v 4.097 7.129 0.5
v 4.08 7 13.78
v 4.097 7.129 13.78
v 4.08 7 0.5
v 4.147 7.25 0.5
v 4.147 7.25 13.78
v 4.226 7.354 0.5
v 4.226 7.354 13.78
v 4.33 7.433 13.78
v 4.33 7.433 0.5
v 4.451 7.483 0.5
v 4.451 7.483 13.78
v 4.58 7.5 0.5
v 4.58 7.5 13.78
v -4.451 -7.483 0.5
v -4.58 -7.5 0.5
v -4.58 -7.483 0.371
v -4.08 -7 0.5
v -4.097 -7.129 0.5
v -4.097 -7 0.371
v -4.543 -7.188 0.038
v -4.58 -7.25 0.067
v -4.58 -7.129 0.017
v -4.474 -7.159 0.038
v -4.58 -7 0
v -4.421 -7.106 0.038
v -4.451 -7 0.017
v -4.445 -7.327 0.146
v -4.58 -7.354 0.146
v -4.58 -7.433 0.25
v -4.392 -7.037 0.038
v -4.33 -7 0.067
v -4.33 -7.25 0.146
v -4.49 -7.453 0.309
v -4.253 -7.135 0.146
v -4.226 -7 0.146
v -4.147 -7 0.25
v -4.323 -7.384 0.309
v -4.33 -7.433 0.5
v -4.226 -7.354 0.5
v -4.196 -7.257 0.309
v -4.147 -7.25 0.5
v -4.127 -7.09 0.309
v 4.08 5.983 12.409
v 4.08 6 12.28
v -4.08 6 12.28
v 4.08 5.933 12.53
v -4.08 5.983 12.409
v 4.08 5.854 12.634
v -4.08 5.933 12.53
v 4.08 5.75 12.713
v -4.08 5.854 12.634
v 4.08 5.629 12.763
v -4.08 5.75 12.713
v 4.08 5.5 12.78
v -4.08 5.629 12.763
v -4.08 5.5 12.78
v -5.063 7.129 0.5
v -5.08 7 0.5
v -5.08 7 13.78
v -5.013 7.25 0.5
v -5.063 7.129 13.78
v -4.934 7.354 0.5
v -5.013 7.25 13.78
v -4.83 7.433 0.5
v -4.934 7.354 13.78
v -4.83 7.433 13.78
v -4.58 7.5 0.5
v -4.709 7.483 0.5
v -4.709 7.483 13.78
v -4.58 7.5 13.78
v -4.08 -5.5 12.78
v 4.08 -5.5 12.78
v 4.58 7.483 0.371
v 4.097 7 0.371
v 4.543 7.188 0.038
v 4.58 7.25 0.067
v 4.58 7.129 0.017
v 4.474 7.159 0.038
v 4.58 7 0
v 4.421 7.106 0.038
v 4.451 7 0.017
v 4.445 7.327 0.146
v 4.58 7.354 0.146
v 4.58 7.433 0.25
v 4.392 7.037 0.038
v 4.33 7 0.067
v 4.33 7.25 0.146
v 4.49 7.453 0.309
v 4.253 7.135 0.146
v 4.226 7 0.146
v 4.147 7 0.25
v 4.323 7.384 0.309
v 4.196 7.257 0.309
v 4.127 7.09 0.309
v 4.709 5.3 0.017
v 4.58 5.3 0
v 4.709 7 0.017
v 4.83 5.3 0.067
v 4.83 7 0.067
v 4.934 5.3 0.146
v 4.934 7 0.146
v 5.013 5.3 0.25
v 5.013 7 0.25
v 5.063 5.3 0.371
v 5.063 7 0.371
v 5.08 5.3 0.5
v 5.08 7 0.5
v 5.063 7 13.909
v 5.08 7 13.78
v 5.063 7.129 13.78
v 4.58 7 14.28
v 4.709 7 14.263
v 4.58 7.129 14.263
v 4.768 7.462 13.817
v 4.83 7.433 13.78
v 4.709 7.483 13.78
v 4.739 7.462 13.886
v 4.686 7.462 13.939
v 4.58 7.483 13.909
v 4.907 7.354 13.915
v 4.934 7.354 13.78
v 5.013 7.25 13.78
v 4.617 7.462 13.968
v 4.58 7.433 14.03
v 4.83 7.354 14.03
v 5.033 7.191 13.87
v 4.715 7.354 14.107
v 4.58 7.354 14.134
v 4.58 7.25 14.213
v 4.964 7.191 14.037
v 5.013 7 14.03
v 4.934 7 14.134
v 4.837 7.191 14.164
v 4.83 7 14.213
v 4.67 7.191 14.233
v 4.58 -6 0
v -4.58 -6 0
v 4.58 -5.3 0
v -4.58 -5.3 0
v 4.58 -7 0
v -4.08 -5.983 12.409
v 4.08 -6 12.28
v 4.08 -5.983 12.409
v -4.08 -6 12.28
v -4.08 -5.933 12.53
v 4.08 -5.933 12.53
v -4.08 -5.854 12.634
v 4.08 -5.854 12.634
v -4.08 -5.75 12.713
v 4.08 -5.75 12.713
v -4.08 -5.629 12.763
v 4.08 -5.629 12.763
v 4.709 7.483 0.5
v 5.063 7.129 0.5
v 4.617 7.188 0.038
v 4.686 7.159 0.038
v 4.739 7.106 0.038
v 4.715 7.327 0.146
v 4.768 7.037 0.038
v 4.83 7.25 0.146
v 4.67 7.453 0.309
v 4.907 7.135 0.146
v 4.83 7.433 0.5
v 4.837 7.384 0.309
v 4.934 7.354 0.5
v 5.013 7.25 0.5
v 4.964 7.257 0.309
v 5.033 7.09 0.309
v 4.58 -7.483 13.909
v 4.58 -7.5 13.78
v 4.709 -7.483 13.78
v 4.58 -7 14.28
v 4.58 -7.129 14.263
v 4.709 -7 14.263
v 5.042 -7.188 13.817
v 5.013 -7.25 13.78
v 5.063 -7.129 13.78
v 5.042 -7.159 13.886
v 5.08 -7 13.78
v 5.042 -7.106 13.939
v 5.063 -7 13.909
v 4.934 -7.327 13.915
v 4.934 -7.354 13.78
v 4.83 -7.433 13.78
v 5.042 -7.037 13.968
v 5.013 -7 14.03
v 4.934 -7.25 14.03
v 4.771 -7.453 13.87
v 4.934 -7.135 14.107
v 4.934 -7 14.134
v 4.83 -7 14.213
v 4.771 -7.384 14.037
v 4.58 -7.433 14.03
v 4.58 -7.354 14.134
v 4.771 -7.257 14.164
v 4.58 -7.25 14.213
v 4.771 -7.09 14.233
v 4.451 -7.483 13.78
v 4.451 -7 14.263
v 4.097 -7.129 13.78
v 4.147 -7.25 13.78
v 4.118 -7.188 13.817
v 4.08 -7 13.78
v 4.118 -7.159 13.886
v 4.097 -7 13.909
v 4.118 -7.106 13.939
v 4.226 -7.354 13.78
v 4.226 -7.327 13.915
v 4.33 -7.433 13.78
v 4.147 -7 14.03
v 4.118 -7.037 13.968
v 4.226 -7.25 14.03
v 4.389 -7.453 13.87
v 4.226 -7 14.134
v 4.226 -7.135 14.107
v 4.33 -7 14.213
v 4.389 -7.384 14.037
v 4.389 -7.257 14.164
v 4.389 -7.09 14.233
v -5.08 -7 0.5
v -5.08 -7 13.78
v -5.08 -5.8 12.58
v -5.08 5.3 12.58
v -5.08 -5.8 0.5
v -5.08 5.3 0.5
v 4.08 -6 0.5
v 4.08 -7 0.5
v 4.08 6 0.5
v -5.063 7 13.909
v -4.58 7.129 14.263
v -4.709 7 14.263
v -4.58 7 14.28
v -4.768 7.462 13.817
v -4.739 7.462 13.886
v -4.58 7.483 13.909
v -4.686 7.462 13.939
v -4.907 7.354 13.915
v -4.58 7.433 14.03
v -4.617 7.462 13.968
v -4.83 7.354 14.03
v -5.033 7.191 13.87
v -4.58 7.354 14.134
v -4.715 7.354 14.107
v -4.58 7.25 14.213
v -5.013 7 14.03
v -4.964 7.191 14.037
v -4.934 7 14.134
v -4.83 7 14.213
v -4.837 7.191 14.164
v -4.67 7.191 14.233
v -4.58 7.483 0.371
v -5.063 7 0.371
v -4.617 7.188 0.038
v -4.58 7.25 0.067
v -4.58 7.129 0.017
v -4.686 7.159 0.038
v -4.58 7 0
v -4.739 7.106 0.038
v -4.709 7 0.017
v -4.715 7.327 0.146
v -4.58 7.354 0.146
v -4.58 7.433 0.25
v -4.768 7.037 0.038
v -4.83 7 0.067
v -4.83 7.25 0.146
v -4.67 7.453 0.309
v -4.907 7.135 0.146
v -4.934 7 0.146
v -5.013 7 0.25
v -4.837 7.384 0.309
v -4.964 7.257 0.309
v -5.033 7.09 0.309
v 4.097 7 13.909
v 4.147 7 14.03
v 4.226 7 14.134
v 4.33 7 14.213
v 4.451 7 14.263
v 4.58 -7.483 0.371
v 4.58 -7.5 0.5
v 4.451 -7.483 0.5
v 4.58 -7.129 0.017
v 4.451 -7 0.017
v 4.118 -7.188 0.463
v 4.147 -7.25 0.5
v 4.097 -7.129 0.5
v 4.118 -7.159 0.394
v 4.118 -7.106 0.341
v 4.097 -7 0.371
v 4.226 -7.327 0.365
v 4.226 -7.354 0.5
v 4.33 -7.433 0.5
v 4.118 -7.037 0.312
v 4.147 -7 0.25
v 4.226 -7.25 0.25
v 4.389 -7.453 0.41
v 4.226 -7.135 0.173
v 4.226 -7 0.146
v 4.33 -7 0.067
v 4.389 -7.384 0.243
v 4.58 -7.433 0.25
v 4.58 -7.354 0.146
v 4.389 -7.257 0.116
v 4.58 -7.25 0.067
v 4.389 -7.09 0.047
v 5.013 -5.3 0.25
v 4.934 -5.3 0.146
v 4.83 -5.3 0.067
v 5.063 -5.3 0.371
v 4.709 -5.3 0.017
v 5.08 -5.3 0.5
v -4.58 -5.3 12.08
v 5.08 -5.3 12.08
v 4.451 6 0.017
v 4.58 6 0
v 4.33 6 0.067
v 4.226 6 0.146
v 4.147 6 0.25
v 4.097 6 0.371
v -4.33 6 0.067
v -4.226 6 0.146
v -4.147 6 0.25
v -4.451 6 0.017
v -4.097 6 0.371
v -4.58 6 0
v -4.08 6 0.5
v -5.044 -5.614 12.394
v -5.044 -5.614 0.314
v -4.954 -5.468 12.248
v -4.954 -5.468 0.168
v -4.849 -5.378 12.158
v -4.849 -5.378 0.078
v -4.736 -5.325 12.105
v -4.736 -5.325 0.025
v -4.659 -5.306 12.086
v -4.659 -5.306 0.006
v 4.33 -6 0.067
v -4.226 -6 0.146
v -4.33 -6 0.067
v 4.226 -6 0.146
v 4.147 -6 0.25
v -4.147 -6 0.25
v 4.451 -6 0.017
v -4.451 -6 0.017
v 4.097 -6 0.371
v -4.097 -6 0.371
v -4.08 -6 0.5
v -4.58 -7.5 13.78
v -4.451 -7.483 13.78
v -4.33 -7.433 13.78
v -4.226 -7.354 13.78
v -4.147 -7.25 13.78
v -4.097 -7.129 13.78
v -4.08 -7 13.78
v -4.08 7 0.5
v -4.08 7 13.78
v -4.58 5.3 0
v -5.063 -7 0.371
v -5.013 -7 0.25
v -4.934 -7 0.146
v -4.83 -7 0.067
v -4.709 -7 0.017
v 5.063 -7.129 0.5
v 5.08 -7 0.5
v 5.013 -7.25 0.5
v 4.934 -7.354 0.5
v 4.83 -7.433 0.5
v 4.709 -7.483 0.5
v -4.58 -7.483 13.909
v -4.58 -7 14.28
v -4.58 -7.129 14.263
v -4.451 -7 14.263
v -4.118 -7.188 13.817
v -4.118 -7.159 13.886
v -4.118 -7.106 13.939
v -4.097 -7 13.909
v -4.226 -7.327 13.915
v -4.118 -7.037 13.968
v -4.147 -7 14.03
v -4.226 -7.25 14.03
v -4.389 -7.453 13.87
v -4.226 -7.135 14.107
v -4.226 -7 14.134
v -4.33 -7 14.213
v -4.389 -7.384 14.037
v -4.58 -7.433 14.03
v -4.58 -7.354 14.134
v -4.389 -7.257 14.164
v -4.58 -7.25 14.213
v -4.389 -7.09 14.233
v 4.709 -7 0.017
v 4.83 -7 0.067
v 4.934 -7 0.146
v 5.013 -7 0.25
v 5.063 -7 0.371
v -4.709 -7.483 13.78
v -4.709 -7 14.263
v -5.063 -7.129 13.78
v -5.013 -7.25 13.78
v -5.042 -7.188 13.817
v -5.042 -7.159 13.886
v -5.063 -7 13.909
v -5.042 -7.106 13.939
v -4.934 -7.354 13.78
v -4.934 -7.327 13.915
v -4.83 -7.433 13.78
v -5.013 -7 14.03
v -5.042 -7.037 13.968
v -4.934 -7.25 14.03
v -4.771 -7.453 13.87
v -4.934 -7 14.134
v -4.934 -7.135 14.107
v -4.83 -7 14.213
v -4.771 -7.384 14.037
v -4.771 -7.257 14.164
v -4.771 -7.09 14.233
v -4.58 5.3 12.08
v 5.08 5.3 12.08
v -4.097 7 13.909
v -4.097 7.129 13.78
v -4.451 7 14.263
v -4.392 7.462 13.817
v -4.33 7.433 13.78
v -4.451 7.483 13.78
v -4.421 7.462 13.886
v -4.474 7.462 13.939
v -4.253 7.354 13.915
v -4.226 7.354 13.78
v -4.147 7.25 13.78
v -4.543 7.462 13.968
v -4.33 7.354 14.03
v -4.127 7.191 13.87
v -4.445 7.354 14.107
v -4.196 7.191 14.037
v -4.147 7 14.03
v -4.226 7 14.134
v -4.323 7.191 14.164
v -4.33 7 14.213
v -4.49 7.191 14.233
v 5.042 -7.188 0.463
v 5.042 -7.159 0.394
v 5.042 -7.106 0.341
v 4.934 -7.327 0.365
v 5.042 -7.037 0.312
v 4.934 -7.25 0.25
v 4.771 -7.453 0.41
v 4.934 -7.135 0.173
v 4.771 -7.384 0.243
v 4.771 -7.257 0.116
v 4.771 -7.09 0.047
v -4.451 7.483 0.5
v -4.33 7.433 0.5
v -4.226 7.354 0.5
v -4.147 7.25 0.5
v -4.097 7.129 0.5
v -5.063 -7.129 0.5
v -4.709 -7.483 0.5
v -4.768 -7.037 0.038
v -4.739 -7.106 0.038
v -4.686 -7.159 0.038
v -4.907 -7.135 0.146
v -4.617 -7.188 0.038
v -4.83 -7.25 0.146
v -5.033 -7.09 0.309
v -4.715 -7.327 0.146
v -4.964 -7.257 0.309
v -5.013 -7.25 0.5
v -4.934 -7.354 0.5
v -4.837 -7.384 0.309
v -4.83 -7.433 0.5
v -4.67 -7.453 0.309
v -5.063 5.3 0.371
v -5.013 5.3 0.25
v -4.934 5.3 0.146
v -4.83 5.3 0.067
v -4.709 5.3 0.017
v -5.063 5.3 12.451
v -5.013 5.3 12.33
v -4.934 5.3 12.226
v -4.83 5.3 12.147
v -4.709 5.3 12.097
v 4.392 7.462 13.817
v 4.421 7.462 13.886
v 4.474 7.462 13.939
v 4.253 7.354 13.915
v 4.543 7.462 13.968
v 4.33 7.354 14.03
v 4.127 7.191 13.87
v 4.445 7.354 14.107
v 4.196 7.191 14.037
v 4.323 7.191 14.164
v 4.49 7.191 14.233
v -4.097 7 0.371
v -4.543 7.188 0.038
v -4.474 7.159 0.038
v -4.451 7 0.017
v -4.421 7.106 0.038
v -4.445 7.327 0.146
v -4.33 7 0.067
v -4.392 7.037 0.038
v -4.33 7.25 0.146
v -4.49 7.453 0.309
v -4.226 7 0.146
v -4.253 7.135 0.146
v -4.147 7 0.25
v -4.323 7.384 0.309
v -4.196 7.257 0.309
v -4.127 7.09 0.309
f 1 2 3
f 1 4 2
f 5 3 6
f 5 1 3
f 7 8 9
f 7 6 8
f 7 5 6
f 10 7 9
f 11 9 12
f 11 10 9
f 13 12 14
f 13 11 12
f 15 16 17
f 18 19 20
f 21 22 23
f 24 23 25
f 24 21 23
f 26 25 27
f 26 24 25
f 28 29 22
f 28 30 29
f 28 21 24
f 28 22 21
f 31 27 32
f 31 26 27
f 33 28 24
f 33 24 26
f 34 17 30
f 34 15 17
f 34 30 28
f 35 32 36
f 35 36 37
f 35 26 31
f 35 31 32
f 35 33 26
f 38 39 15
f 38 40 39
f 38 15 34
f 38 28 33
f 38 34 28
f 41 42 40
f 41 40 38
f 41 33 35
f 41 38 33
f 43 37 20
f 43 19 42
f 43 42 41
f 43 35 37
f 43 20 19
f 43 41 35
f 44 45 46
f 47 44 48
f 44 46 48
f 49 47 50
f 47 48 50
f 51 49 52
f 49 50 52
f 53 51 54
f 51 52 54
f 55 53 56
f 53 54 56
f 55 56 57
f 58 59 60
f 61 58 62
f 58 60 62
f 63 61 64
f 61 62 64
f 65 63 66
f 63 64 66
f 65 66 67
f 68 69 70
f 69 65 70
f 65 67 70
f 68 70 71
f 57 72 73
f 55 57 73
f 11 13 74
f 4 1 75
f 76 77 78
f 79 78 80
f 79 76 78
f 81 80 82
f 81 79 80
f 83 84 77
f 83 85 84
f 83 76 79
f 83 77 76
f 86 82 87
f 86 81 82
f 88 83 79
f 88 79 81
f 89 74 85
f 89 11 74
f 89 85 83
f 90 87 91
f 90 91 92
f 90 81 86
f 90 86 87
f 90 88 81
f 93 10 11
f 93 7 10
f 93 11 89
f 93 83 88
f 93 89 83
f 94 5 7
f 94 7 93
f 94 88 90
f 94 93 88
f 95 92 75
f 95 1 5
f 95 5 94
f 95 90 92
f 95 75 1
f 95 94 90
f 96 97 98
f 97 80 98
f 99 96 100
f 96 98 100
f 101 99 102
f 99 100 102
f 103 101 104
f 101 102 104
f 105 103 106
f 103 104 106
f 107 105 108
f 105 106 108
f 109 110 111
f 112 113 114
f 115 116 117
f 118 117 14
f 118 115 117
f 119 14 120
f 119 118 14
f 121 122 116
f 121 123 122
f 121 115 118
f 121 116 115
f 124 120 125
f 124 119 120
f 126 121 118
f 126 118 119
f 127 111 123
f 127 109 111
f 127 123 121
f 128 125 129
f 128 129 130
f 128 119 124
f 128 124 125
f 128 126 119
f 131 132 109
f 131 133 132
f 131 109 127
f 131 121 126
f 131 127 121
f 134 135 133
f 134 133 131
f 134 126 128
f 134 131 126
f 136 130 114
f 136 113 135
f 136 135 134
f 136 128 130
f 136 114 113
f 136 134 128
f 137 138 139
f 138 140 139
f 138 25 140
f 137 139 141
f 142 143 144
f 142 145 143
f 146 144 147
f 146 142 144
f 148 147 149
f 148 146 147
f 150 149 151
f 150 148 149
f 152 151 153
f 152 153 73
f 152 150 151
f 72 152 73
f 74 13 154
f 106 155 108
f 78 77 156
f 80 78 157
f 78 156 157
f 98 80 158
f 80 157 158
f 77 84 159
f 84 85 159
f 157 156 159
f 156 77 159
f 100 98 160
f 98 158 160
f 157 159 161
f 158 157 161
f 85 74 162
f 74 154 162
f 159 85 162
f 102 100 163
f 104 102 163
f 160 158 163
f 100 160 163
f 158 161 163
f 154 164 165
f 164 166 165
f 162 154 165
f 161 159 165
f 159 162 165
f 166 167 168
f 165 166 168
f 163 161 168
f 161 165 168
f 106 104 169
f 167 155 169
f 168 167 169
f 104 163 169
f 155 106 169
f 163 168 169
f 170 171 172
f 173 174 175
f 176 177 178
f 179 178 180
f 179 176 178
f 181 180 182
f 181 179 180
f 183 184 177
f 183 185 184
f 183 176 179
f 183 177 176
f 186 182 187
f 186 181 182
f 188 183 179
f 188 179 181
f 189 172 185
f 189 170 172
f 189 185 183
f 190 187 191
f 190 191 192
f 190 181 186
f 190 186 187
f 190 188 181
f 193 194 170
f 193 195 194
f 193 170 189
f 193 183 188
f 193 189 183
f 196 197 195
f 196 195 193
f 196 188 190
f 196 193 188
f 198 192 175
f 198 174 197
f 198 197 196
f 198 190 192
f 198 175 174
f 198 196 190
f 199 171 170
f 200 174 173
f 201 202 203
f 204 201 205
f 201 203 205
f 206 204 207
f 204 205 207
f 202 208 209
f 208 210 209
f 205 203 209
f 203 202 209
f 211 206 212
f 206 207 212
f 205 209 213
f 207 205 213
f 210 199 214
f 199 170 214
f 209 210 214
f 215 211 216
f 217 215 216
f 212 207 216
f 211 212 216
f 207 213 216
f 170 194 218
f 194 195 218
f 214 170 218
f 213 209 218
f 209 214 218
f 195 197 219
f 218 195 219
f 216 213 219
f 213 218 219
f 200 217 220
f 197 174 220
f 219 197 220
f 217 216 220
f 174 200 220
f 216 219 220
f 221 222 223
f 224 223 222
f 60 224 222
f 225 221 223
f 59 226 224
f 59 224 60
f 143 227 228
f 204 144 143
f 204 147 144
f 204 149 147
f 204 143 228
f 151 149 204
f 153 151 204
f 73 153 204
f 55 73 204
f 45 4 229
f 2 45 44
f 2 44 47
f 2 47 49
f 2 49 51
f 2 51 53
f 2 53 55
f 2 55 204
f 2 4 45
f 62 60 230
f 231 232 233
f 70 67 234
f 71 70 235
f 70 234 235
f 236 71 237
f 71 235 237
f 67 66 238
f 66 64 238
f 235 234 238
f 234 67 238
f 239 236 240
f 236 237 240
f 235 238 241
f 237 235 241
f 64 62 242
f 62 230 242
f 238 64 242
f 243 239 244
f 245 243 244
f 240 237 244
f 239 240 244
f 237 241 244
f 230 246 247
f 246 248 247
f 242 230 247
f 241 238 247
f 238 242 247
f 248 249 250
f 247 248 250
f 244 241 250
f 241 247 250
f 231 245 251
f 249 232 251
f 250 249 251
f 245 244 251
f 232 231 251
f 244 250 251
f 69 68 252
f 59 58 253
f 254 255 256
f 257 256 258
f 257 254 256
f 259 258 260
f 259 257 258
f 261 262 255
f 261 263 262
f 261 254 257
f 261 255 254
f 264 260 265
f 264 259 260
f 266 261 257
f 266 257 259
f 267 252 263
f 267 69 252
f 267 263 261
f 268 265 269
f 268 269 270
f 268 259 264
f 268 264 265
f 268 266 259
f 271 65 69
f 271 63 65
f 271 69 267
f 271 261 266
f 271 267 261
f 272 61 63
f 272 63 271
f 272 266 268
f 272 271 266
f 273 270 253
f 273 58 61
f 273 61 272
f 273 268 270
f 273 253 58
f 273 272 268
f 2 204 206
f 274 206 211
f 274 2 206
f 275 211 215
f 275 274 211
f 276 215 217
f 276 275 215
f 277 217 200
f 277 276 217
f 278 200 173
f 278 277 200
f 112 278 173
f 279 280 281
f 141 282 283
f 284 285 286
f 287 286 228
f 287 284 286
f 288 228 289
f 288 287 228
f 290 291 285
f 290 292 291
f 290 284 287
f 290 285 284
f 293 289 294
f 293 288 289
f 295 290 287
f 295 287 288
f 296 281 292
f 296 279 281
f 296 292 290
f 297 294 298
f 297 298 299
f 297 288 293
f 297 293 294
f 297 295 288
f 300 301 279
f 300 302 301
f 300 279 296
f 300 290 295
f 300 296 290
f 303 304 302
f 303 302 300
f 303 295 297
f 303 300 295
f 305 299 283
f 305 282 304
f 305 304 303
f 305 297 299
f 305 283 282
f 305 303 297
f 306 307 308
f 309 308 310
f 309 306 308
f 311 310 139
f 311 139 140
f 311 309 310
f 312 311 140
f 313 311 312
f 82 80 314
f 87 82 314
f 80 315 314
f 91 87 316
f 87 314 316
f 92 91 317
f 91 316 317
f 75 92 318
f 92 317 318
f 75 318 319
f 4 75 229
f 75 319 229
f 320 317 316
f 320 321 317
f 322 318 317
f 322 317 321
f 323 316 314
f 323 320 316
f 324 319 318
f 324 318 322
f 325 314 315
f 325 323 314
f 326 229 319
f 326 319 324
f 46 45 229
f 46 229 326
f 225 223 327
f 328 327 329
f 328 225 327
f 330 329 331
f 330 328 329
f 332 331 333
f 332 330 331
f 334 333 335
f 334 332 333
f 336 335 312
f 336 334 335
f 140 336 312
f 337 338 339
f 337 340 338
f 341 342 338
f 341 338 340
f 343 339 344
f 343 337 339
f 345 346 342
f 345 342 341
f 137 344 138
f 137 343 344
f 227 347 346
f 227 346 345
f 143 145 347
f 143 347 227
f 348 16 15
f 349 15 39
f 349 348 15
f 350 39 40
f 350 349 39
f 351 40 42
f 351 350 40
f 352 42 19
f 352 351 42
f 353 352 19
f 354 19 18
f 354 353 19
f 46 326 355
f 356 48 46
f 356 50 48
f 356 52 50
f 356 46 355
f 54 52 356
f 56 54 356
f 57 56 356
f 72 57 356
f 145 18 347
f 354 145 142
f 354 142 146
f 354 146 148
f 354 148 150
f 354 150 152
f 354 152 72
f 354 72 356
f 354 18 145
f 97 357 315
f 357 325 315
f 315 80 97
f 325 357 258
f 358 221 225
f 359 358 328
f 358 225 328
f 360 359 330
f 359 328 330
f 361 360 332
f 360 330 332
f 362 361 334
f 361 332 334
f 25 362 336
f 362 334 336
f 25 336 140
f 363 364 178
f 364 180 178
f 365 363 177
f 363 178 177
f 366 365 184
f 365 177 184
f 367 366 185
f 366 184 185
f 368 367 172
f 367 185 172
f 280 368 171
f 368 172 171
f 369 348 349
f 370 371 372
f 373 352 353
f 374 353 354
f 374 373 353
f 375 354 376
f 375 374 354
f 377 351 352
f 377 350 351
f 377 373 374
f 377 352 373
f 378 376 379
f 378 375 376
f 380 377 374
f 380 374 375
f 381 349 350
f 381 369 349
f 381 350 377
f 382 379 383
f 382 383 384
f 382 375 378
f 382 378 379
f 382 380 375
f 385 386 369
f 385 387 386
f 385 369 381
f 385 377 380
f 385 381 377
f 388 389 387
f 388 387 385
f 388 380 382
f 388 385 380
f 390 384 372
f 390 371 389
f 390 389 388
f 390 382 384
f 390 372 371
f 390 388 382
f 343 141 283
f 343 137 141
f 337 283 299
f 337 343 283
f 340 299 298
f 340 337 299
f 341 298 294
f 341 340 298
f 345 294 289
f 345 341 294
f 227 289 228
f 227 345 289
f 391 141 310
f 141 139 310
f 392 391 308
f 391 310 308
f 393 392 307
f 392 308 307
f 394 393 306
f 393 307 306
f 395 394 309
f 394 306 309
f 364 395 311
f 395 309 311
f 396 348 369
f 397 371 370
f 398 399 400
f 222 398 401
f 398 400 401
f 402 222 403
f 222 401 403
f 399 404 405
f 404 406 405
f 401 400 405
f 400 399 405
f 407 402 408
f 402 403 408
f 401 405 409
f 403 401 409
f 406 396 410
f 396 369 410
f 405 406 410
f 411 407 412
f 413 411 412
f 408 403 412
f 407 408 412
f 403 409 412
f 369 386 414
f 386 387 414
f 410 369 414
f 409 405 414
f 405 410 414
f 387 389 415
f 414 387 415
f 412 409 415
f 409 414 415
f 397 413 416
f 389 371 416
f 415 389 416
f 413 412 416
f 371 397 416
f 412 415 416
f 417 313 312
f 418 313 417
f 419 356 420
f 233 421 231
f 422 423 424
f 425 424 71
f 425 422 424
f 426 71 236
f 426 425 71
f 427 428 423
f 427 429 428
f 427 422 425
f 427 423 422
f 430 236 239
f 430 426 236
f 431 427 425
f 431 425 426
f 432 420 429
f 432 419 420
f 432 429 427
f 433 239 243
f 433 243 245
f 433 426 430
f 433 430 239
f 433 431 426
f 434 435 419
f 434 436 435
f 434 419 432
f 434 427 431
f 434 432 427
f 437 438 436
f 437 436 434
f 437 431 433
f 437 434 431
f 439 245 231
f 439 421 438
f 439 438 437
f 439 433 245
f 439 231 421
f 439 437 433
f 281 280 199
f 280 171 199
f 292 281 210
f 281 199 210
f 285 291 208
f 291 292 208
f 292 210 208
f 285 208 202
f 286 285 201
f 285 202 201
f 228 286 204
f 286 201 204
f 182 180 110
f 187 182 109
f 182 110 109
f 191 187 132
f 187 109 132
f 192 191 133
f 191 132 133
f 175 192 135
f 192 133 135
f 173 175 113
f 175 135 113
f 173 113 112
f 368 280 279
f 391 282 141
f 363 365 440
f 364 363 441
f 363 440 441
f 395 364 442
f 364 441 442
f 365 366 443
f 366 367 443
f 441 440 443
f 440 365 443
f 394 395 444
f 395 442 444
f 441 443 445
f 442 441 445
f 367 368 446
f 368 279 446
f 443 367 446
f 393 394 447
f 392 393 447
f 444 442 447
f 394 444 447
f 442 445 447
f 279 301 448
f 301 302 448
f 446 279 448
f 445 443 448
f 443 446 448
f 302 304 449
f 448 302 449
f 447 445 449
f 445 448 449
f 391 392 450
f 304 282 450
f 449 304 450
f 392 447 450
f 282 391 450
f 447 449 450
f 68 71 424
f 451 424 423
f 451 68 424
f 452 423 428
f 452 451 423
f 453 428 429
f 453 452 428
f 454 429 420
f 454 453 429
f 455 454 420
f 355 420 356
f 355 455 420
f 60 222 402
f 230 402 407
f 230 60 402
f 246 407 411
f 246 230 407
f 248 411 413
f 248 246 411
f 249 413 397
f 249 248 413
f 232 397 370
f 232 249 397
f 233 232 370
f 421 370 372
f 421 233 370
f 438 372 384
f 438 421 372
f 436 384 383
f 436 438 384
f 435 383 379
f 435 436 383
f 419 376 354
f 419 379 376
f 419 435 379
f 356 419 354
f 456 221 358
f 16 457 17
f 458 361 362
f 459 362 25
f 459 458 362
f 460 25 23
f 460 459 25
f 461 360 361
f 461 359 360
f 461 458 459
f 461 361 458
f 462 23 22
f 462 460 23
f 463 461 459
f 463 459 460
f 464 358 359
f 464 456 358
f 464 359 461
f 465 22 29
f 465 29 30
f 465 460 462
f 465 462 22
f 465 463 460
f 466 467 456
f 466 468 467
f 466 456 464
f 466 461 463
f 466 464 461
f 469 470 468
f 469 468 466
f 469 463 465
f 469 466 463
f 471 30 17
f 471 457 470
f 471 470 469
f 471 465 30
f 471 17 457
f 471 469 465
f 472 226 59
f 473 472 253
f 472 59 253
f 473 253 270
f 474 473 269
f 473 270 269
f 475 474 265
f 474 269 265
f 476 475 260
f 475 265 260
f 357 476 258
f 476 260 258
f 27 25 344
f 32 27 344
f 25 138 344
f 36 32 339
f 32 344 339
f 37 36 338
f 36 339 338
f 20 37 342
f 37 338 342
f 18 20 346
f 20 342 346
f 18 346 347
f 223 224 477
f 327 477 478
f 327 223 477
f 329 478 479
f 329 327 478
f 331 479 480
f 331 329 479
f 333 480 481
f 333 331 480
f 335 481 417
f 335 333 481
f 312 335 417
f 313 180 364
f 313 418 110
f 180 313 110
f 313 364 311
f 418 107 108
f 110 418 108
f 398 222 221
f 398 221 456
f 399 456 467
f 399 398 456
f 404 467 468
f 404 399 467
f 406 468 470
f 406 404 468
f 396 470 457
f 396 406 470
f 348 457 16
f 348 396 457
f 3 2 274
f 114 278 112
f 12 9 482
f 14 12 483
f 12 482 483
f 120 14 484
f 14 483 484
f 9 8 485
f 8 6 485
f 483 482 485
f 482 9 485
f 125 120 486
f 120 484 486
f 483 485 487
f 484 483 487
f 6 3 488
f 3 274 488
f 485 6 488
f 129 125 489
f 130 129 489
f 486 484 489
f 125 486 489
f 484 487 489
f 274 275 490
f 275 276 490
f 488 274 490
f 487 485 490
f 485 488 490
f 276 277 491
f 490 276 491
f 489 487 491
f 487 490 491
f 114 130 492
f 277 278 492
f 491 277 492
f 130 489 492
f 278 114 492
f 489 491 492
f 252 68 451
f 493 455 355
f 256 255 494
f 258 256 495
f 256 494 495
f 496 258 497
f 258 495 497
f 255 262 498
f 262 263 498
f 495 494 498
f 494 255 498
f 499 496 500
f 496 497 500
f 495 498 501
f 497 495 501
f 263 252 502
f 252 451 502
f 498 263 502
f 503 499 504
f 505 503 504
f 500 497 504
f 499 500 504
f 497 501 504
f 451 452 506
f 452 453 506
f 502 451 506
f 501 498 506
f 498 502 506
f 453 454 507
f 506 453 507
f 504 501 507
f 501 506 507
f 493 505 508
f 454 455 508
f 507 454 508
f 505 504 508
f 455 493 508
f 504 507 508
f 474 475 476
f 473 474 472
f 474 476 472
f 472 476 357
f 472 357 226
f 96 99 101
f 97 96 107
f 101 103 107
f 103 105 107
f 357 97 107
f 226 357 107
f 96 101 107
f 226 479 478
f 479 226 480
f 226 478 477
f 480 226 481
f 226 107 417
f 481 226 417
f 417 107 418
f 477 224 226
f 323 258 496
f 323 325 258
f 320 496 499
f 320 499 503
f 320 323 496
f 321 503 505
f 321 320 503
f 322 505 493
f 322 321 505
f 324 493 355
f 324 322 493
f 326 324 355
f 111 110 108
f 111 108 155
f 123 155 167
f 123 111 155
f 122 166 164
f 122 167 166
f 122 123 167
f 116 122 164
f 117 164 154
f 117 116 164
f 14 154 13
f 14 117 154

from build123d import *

# Parameters (mm, degrees)
F0_W     = 10.16
F0_H     = 15
F1_DEPTH = 14.28
F2_W     = 8.16
F2_H     = 14.28
F5_DEPTH = 1.5
F3_W     = 8.16
F3_H     = 15
F6_DEPTH = 1.5
F4_W     = 8.16
F4_H     = 14.28
F7_DEPTH = 1.5
F8_W     = 10.6
F8_H     = 12.08
F9_DEPTH = 25
F10_R    = 0.49999


# Not quite as in the source:
# - a fillet or chamfer is up to 0.001 mm smaller than in the source, because OpenCascade refuses the exact size


with BuildPart() as f1:
    # F0 (on Top) → F1 (new body)
    with BuildSketch(Plane.XY):
        Rectangle(F0_W, F0_H)
    extrude(amount=F1_DEPTH)

    # F2 (on face) → F5 (cut)
    with BuildSketch(Plane.XZ.offset(7.5)):
        with Locations((0, 7.14)):
            Rectangle(F2_W, F2_H)
    extrude(amount=-F5_DEPTH, mode=Mode.SUBTRACT)

    # F3 (on face) → F6 (cut)
    with BuildSketch(Plane.XY.offset(14.28)):
        Rectangle(F3_W, F3_H)
    extrude(amount=-F6_DEPTH, mode=Mode.SUBTRACT)

    # F4 (on face) → F7 (cut)
    with BuildSketch(Plane(origin=(0, 7.5, 0), x_dir=(-1, 0, 0), z_dir=(0, 1, 0))):
        with Locations((0, 7.14)):
            Rectangle(F4_W, F4_H)
    extrude(amount=-F7_DEPTH, mode=Mode.SUBTRACT)

    # F8 (on face) → F9 (cut)
    with BuildSketch(Plane.YZ.offset(5.08)):
        with Locations((0, 6.04)):
            Rectangle(F8_W, F8_H)
    extrude(amount=-F9_DEPTH, mode=Mode.SUBTRACT)

    # F10 (radius 0.5 in the source; OpenCascade refuses exactly that, so slightly less here)
    f10_edges = [f1.edges().sort_by_distance(p)[0] for p in [
        (-4.58, -7.5, 14.28),
        (4.58, -7.5, 14.28),
        (-4.08, -7.5, 7.14),
        (-5.08, -7.5, 7.14),
        (-5.08, 0, 14.28),
        (-5.08, 0, 12.08),
        (-5.08, -5.3, 6.04),
        (-5.08, -6.4, 0),
        (-4.58, -7.5, 0),
        (4.58, -7.5, 0),
        (4.08, -7.5, 7.14),
        (5.08, -7.5, 7.14),
        (5.08, 0, 14.28),
        (-4.08, 0, 14.28),
        (4.08, 0, 14.28),
        (5.08, 7.5, 7.14),
        (4.08, 7.5, 7.14),
        (-4.08, 7.5, 7.14),
        (-5.08, 7.5, 7.14),
        (-4.58, 7.5, 14.28),
        (4.58, 7.5, 14.28),
        (4.58, 7.5, 0),
        (-4.58, 7.5, 0),
        (-5.08, 6.4, 0),
        (-4.08, 6.75, 0),
        (4.08, 6.75, 0),
        (5.08, 6.4, 0),
        (5.08, -6.4, 0),
        (-4.08, -6.75, 0),
        (4.08, -6.75, 0),
        (0, -6, 12.78),
        (0, 6, 12.78),
    ]]
    fillet(f10_edges, radius=F10_R)


solid = f1.part
